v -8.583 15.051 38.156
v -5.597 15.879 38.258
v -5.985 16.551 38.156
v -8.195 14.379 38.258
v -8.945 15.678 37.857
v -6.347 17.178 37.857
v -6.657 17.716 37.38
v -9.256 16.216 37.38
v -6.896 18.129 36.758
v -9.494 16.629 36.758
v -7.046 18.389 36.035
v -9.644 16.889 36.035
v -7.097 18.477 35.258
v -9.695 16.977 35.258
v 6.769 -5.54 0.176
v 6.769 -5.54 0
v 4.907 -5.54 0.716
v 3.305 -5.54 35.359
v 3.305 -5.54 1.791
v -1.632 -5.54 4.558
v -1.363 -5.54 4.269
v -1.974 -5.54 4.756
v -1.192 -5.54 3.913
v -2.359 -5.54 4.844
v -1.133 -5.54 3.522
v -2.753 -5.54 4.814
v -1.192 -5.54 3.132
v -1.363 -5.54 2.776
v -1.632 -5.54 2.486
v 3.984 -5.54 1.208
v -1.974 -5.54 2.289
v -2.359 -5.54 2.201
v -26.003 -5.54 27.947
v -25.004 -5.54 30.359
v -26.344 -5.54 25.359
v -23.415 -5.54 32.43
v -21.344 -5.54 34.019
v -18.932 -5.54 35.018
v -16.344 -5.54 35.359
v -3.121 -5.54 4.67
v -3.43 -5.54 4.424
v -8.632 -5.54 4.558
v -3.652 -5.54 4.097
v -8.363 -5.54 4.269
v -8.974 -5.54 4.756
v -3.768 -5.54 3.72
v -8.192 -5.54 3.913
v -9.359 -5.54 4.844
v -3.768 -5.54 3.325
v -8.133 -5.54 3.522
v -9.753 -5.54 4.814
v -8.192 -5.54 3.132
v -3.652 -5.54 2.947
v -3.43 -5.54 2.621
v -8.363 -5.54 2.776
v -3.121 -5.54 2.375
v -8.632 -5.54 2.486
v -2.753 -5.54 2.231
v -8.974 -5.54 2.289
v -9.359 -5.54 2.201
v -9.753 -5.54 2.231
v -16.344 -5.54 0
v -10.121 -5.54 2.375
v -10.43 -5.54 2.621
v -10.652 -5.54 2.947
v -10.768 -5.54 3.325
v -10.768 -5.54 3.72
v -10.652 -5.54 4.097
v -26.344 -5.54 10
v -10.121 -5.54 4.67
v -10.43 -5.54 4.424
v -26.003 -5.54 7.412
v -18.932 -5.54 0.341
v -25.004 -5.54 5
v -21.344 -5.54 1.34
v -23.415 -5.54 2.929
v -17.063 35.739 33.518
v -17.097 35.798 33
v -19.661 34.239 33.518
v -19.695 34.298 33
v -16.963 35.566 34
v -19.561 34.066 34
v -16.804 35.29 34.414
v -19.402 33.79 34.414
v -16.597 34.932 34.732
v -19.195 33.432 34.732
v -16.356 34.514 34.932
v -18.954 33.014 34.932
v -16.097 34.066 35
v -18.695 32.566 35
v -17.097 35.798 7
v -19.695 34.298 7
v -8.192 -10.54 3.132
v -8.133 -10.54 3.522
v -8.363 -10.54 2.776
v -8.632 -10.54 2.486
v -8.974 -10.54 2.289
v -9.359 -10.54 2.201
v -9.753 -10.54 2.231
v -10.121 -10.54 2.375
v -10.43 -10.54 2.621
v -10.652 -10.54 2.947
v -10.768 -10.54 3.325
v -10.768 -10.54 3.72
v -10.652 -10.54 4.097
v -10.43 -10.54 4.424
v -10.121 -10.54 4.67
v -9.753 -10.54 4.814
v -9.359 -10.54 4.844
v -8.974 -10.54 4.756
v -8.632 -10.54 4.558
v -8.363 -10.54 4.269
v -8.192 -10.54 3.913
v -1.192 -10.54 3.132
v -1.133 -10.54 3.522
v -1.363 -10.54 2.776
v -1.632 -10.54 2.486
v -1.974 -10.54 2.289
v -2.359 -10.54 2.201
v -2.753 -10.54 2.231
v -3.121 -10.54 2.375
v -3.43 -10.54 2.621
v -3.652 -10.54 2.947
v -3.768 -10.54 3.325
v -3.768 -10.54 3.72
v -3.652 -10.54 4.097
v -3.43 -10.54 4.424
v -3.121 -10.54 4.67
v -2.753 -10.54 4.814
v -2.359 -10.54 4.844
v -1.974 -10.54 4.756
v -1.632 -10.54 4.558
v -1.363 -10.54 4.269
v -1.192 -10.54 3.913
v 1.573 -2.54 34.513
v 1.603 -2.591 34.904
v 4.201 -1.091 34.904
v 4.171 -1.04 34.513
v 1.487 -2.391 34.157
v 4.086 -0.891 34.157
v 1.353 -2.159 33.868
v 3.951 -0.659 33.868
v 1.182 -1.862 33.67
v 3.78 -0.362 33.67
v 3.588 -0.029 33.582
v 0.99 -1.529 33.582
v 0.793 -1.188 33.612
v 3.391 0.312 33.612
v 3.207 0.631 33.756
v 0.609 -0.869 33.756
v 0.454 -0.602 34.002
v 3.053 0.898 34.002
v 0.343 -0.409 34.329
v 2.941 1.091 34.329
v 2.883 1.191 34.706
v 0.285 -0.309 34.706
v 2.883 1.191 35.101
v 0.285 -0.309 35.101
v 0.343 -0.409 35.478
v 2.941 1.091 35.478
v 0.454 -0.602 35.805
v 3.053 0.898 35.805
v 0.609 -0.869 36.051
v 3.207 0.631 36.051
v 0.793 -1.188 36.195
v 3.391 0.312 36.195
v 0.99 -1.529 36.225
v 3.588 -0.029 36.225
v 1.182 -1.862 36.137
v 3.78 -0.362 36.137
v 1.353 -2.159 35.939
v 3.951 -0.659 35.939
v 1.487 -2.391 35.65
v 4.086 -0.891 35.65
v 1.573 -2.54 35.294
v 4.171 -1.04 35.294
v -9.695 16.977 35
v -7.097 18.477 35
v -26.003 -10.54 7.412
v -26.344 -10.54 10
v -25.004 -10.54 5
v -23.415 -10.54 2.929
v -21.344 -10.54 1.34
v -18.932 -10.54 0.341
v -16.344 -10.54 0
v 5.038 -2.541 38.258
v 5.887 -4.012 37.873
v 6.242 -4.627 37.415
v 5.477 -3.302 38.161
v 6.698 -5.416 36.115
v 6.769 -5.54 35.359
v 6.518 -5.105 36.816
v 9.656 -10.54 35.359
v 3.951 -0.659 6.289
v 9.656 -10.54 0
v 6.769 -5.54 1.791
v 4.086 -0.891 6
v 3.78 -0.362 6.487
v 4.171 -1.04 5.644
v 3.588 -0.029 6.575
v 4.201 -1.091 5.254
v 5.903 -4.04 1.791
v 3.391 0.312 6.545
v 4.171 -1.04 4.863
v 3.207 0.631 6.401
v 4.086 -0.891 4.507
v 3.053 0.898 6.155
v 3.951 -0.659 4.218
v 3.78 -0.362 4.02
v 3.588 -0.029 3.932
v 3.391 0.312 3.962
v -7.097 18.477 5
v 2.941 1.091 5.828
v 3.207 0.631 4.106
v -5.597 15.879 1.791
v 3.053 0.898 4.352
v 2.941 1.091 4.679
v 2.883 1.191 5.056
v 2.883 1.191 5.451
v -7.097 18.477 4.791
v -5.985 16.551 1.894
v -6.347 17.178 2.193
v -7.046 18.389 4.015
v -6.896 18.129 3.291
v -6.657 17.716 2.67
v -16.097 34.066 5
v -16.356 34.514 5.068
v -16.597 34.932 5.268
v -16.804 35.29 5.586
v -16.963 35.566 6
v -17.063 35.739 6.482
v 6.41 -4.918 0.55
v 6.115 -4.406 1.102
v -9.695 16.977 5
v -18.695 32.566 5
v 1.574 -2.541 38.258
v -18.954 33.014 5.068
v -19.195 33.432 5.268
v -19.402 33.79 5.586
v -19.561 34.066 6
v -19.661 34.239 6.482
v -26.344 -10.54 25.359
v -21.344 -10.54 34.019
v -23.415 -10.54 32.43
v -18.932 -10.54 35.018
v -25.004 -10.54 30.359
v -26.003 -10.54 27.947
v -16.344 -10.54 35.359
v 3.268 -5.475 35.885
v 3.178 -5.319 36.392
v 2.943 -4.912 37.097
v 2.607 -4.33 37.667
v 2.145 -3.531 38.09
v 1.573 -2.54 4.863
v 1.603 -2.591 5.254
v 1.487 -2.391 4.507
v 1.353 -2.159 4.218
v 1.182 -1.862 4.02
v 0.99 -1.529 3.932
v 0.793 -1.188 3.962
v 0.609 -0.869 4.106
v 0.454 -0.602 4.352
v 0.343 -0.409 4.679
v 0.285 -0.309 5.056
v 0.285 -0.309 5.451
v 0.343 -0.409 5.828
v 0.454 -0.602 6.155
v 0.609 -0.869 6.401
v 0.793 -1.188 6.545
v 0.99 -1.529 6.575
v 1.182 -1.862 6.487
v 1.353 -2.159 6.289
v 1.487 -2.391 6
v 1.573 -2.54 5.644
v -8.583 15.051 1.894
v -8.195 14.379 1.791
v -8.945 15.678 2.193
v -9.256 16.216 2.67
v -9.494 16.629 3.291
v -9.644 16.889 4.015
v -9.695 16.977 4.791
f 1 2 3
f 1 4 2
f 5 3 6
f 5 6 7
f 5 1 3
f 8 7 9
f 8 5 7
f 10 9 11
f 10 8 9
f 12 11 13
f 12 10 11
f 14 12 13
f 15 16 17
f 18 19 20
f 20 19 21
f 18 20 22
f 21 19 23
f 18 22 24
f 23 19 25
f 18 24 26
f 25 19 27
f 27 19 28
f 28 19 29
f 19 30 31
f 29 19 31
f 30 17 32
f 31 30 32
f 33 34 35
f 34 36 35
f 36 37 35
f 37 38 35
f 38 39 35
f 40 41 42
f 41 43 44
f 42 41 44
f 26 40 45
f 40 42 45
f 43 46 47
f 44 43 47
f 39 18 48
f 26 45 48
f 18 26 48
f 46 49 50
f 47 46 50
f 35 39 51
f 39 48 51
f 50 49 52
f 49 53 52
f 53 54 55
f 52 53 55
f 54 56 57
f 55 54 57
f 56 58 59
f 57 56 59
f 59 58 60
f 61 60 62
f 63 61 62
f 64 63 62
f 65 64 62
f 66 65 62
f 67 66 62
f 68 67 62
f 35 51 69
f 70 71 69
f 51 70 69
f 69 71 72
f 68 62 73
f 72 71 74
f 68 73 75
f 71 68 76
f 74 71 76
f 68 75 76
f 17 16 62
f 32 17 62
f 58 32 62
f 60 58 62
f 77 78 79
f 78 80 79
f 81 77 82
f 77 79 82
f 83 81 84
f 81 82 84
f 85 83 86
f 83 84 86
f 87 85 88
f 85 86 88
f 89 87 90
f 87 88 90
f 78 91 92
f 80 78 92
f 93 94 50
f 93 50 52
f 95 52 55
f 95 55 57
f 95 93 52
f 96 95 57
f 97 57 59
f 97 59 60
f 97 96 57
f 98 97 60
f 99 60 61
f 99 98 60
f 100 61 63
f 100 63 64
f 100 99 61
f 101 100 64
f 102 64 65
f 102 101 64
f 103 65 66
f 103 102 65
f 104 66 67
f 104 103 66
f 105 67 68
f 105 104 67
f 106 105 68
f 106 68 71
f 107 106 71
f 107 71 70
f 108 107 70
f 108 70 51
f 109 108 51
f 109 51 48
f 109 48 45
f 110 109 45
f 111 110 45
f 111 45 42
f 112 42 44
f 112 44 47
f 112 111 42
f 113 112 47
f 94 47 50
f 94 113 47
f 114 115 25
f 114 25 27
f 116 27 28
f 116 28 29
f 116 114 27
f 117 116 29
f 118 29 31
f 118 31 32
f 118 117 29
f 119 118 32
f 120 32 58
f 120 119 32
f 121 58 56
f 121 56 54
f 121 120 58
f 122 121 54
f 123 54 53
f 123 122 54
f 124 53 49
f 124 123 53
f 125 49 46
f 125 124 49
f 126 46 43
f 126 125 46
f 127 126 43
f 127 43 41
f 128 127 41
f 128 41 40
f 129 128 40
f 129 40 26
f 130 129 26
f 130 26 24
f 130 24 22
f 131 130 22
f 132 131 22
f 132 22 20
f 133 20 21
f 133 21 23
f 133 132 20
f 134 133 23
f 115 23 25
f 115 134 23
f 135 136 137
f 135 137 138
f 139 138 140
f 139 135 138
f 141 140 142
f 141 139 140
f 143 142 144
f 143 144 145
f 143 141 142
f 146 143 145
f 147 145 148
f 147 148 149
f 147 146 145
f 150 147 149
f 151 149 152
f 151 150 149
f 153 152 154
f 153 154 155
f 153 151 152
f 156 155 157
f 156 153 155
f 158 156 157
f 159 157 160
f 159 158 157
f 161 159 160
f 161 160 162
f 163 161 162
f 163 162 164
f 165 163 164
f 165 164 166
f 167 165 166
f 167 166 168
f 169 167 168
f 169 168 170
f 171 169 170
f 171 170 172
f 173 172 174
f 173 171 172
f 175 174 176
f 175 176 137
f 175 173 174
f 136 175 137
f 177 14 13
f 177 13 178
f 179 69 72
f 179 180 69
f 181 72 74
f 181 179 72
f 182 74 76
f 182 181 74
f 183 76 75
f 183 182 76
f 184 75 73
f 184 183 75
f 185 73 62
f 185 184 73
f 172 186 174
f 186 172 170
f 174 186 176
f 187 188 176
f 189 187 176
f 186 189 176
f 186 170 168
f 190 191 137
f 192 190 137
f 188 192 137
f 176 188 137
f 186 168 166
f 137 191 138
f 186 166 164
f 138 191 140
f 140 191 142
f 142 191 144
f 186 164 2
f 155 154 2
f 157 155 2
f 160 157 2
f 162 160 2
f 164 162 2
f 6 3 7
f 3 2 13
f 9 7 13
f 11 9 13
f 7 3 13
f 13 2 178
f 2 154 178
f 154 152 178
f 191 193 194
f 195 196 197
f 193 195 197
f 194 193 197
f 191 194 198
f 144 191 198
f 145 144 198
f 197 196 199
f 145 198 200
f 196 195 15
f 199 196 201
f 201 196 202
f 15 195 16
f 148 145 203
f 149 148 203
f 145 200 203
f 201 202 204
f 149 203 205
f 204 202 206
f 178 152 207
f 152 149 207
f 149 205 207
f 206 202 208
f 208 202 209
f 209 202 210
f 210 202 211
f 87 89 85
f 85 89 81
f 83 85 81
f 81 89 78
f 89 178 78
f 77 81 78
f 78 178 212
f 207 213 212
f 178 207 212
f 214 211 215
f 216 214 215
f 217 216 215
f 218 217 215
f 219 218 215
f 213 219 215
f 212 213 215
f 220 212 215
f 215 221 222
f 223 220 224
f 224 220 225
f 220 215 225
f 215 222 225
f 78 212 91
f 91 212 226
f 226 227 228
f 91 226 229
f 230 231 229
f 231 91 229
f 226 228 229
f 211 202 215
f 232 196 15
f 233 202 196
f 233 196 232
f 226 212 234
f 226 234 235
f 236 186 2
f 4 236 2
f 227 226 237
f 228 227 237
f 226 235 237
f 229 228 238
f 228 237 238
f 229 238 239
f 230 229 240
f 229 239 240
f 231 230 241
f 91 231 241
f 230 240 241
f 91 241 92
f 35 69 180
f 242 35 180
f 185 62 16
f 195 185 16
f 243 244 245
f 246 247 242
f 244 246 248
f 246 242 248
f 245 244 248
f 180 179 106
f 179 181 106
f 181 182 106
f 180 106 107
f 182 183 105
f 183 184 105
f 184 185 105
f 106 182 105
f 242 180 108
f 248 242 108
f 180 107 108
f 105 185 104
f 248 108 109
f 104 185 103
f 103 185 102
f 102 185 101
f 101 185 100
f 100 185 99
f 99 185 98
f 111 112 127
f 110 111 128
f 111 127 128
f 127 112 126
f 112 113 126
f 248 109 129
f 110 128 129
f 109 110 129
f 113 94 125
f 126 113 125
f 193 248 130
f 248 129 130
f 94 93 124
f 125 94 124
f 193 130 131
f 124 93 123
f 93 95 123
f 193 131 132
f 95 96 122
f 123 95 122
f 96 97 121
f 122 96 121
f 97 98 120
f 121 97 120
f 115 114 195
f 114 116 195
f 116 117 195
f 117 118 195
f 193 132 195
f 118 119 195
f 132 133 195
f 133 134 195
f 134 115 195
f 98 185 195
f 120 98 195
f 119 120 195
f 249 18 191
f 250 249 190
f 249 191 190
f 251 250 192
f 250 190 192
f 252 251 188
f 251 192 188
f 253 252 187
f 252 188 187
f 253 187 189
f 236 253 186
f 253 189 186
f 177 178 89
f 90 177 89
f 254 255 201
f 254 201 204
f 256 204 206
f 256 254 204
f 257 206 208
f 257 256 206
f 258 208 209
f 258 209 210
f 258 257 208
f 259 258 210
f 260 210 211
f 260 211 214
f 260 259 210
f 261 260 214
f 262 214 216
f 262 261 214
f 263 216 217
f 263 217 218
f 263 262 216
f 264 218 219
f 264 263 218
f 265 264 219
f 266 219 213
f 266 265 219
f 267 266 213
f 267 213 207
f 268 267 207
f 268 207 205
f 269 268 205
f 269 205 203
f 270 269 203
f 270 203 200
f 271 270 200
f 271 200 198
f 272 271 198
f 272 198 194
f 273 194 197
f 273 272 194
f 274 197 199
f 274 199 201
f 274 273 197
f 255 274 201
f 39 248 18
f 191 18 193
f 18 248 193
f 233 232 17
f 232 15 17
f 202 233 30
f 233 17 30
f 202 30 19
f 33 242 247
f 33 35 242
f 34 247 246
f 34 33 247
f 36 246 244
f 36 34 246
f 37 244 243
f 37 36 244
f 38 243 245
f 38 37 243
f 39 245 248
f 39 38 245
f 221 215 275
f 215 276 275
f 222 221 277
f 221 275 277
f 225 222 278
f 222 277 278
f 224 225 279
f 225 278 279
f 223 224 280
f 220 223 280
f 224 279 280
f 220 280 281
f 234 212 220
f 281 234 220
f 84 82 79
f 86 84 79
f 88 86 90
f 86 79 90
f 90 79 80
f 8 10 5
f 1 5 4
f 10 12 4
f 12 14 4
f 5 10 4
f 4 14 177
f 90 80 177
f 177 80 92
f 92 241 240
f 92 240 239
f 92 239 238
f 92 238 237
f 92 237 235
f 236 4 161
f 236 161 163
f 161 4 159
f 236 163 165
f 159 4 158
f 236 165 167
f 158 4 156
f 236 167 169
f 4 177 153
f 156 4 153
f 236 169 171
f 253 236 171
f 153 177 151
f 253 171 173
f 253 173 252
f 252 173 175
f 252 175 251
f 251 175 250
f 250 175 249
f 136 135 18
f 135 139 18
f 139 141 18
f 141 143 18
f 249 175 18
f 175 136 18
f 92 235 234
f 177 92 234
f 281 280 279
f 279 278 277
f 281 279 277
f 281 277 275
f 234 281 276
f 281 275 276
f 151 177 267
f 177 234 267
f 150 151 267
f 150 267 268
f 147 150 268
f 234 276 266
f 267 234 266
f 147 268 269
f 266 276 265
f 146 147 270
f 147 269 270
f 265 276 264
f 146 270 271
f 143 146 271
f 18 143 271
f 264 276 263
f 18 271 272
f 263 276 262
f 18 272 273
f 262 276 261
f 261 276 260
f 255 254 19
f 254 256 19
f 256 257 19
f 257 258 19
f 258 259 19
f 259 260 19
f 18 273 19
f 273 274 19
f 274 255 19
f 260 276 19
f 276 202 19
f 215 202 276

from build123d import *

# Parameters (mm, degrees)
EXTRUDE_1_DEPTH                  = 40
HOLE_START                       = 0.092539292
HOLE_WIZARD_3_0_2_65_1_OUTLINE_R = 1.325
HOLE_WIZARD_3_0_2_65_1_DEPTH     = 3
SKETCH_7_W                       = 5
SKETCH_7_H                       = 20
CUT_EXTRUDE_1_DEPTH              = 3
HOLE_START_2                     = -10.539590986
HOLE_WIZARD_3_0_2_65_2_OUTLINE_R = 1.325
HOLE_WIZARD_3_0_2_65_2_DEPTH     = 5
HOLE_WIZARD_3_0_2_65_3_OUTLINE_R = 1.325
HOLE_WIZARD_3_0_2_65_3_DEPTH     = 5
FILLET_3_R                       = 2
SKETCH_20_W                      = 36
SKETCH_20_H                      = 4.641244585
CUT_EXTRUDE_3_DEPTH              = 5
SKETCH_23_W                      = 1.741527355
SKETCH_23_H                      = 27.732050807
CUT_EXTRUDE_4_DEPTH              = 3
SKETCH_24_W                      = 1.79143138
SKETCH_24_H                      = 27.732050807
CUT_EXTRUDE_5_DEPTH              = 3
SKETCH_26_W                      = 1.79143138
SKETCH_26_H                      = 1.733650564
EXTRUDE_2_DEPTH                  = 3
FILLET_4_R                       = 10
FILLET_5_R                       = 3
FILLET_6_R                       = 3
FILLET_7_R                       = 3


# Read off the part's stored shape, not the designer's step: Ø3.0 (2.65) 直径孔1, Ø3.0 (2.65) 直径孔2, Ø3.0 (2.65) 直径孔3
with BuildPart() as part:
    # 草图1 → 凸台-拉伸1 (new body)
    with BuildSketch(Plane.XY):
        Polygon((-26.344007522, -10.539590986), (9.655992478, -10.539590986), (-17.096784272, 35.797577588), (-19.694860483, 34.297577588), (3.305139517, -5.539590986), (-26.344007522, -5.539590986), align=None)
    extrude(amount=EXTRUDE_1_DEPTH)

    # Ø3.0 (2.65) 直径孔1 outline → Ø3.0 (2.65) 直径孔1 (cut)
    with BuildSketch(Plane(origin=(0, 0, 0), x_dir=(0.500000000000004, -0.8660254037844363, 0), z_dir=(0.8660254037844363, 0.5000000000000042, 0)).offset(HOLE_START)):
        with Locations((1.719905554, -5.253562617)):
            Circle(HOLE_WIZARD_3_0_2_65_1_OUTLINE_R)
        with Locations((1.719905554, -34.903562617)):
            Circle(HOLE_WIZARD_3_0_2_65_1_OUTLINE_R)
    extrude(amount=HOLE_WIZARD_3_0_2_65_1_DEPTH, mode=Mode.SUBTRACT)

    # 草图7 → 切除-拉伸1 (cut)
    with BuildSketch(Plane(origin=(2.678217589, 1.546269646, 0), x_dir=(0, 0, -1), z_dir=(0.8660254037844364, 0.5000000000000041, 0))):
        with Locations((-37.5, 29.550003721)):
            Rectangle(SKETCH_7_W, SKETCH_7_H)
        with Locations((-2.5, 29.550003721)):
            Rectangle(SKETCH_7_W, SKETCH_7_H)
    extrude(amount=-CUT_EXTRUDE_1_DEPTH, mode=Mode.SUBTRACT)

    # Ø3.0 (2.65) 直径孔2 outline → Ø3.0 (2.65) 直径孔2 (cut)
    with BuildSketch(Plane(origin=(0, 0, 0), x_dir=(1, 0, 0), z_dir=(0, 1, 0)).offset(HOLE_START_2)):
        with Locations((-9.458240247, -3.522342215)):
            Circle(HOLE_WIZARD_3_0_2_65_2_OUTLINE_R)
        with Locations((-2.458240247, -3.522342215)):
            Circle(HOLE_WIZARD_3_0_2_65_2_OUTLINE_R)
    extrude(amount=HOLE_WIZARD_3_0_2_65_2_DEPTH, mode=Mode.SUBTRACT)

    # Ø3.0 (2.65) 直径孔3 outline → Ø3.0 (2.65) 直径孔3 (cut)
    with BuildSketch(Plane(origin=(0, 0, 0), x_dir=(1, 0, 0), z_dir=(0, 1, 0)).offset(HOLE_START_2)):
        with Locations((-1.947010607, -36.908916004)):
            Circle(HOLE_WIZARD_3_0_2_65_3_OUTLINE_R)
        with Locations((-8.947010607, -36.908916004)):
            Circle(HOLE_WIZARD_3_0_2_65_3_OUTLINE_R)
    extrude(amount=HOLE_WIZARD_3_0_2_65_3_DEPTH, mode=Mode.SUBTRACT)

    # 圆角3
    fillet_3_edges = [part.edges().sort_by_distance(p)[0] for p in [
        (-18.395822378, 35.047577588, 35),
        (-18.395822378, 35.047577588, 5),
    ]]
    fillet(fillet_3_edges, radius=FILLET_3_R)

    # 草图20 → 切除-拉伸3 (cut)
    with BuildSketch(Plane.XZ.offset(10.539590986)):
        with Locations((-8.344007522, 37.679377708)):
            Rectangle(SKETCH_20_W, SKETCH_20_H)
    extrude(amount=-CUT_EXTRUDE_3_DEPTH, mode=Mode.SUBTRACT)

    # 草图23 → 切除-拉伸4 (cut)
    with BuildSketch(Plane(origin=(2.678217589, 1.546269646, 0), x_dir=(0, 0, -1), z_dir=(0.8660254037844364, 0.5000000000000041, 0))):
        with Locations((-39.129236323, 5.683978317)):
            Rectangle(SKETCH_23_W, SKETCH_23_H)
    extrude(amount=-CUT_EXTRUDE_4_DEPTH, mode=Mode.SUBTRACT)

    # 草图24 → 切除-拉伸5 (cut)
    with BuildSketch(Plane(origin=(2.678217589, 1.546269646, 0), x_dir=(0, 0, -1), z_dir=(0.8660254037844364, 0.5000000000000041, 0))):
        with Locations((-0.89571569, 5.683978317)):
            Rectangle(SKETCH_24_W, SKETCH_24_H)
    extrude(amount=-CUT_EXTRUDE_5_DEPTH, mode=Mode.SUBTRACT)

    # 草图26 → 凸台-拉伸2 (add)
    with BuildSketch(Plane(origin=(0.080141377, 0.046269646, 0), x_dir=(0, 0, -1), z_dir=(0.8660254037844364, 0.5000000000000041, 0))):
        with Locations((-0.89571569, -7.316821561)):
            Rectangle(SKETCH_26_W, SKETCH_26_H)
    extrude(amount=EXTRUDE_2_DEPTH)

    # 圆角4
    fillet_4_edges = [part.edges().sort_by_distance(p)[0] for p in [
        (-26.344007522, -8.039590986, 35.358755415),
        (-26.344007522, -8.039590986, 0),
    ]]
    fillet(fillet_4_edges, radius=FILLET_4_R)

    # 圆角5
    fillet_5_edges = [part.edges().sort_by_distance(p)[0] for p in [
        (-8.395822378, 17.727069512, 38.258472645),
        (-8.395822378, 17.727069512, 1.79143138),
    ]]
    fillet(fillet_5_edges, radius=FILLET_5_R)

    # 圆角6
    # the kernel refuses this fillet: 3 mm, written as the material it takes off along each edge
    with BuildSketch(Plane(origin=(14.265049697, -5.539590986, 38.258472645), x_dir=(0, 0, -1), z_dir=(-1, 0, 0))) as fillet_6_piece_1:
        with BuildLine():
            CenterArc((3, -2.998323426), FILLET_6_R, 91.915616688, 88.084383312)
            Line((0, -2.998323426), (-0.06, -2.998323426))
            Line((-0.06, -2.998323426), (-0.06, 0))
            Line((-0.06, 0), (0, 0.06))
            ThreePointArc((0, 0.06), (1.449858615, 0.06), (2.897711575, 0.059966469))
            Line((2.897711575, 0.059966469), (2.89971723, 0))
        make_face()
    extrude(amount=18.455718744, mode=Mode.SUBTRACT)

    # 圆角7
    # the kernel refuses this fillet: 3 mm, written as the material it takes off along each edge
    with BuildSketch(Plane(origin=(-2.639669888, -8.971828296, 0), x_dir=(0, 0, 1), z_dir=(0.8660254037844363, 0.5000000000000041, 0))) as fillet_7_piece_1_section:
        with BuildLine():
            CenterArc((3, 2.745789848), FILLET_7_R, 180, 66.243144393)
            Line((0, 2.745789848), (0, 0))
            Line((0, 0), (1.79143138, 0))
        make_face()
    fillet_7_piece_1 = extrude(amount=16.728949241, mode=Mode.PRIVATE)
    fillet_7_piece_1 = split(fillet_7_piece_1, bisect_by=Plane(origin=(4.952096939, -5.539590986, 0.801424093), z_dir=(0, 1, 0)), keep=Keep.TOP, mode=Mode.PRIVATE)
    add(fillet_7_piece_1, mode=Mode.SUBTRACT)


solid = part.part
